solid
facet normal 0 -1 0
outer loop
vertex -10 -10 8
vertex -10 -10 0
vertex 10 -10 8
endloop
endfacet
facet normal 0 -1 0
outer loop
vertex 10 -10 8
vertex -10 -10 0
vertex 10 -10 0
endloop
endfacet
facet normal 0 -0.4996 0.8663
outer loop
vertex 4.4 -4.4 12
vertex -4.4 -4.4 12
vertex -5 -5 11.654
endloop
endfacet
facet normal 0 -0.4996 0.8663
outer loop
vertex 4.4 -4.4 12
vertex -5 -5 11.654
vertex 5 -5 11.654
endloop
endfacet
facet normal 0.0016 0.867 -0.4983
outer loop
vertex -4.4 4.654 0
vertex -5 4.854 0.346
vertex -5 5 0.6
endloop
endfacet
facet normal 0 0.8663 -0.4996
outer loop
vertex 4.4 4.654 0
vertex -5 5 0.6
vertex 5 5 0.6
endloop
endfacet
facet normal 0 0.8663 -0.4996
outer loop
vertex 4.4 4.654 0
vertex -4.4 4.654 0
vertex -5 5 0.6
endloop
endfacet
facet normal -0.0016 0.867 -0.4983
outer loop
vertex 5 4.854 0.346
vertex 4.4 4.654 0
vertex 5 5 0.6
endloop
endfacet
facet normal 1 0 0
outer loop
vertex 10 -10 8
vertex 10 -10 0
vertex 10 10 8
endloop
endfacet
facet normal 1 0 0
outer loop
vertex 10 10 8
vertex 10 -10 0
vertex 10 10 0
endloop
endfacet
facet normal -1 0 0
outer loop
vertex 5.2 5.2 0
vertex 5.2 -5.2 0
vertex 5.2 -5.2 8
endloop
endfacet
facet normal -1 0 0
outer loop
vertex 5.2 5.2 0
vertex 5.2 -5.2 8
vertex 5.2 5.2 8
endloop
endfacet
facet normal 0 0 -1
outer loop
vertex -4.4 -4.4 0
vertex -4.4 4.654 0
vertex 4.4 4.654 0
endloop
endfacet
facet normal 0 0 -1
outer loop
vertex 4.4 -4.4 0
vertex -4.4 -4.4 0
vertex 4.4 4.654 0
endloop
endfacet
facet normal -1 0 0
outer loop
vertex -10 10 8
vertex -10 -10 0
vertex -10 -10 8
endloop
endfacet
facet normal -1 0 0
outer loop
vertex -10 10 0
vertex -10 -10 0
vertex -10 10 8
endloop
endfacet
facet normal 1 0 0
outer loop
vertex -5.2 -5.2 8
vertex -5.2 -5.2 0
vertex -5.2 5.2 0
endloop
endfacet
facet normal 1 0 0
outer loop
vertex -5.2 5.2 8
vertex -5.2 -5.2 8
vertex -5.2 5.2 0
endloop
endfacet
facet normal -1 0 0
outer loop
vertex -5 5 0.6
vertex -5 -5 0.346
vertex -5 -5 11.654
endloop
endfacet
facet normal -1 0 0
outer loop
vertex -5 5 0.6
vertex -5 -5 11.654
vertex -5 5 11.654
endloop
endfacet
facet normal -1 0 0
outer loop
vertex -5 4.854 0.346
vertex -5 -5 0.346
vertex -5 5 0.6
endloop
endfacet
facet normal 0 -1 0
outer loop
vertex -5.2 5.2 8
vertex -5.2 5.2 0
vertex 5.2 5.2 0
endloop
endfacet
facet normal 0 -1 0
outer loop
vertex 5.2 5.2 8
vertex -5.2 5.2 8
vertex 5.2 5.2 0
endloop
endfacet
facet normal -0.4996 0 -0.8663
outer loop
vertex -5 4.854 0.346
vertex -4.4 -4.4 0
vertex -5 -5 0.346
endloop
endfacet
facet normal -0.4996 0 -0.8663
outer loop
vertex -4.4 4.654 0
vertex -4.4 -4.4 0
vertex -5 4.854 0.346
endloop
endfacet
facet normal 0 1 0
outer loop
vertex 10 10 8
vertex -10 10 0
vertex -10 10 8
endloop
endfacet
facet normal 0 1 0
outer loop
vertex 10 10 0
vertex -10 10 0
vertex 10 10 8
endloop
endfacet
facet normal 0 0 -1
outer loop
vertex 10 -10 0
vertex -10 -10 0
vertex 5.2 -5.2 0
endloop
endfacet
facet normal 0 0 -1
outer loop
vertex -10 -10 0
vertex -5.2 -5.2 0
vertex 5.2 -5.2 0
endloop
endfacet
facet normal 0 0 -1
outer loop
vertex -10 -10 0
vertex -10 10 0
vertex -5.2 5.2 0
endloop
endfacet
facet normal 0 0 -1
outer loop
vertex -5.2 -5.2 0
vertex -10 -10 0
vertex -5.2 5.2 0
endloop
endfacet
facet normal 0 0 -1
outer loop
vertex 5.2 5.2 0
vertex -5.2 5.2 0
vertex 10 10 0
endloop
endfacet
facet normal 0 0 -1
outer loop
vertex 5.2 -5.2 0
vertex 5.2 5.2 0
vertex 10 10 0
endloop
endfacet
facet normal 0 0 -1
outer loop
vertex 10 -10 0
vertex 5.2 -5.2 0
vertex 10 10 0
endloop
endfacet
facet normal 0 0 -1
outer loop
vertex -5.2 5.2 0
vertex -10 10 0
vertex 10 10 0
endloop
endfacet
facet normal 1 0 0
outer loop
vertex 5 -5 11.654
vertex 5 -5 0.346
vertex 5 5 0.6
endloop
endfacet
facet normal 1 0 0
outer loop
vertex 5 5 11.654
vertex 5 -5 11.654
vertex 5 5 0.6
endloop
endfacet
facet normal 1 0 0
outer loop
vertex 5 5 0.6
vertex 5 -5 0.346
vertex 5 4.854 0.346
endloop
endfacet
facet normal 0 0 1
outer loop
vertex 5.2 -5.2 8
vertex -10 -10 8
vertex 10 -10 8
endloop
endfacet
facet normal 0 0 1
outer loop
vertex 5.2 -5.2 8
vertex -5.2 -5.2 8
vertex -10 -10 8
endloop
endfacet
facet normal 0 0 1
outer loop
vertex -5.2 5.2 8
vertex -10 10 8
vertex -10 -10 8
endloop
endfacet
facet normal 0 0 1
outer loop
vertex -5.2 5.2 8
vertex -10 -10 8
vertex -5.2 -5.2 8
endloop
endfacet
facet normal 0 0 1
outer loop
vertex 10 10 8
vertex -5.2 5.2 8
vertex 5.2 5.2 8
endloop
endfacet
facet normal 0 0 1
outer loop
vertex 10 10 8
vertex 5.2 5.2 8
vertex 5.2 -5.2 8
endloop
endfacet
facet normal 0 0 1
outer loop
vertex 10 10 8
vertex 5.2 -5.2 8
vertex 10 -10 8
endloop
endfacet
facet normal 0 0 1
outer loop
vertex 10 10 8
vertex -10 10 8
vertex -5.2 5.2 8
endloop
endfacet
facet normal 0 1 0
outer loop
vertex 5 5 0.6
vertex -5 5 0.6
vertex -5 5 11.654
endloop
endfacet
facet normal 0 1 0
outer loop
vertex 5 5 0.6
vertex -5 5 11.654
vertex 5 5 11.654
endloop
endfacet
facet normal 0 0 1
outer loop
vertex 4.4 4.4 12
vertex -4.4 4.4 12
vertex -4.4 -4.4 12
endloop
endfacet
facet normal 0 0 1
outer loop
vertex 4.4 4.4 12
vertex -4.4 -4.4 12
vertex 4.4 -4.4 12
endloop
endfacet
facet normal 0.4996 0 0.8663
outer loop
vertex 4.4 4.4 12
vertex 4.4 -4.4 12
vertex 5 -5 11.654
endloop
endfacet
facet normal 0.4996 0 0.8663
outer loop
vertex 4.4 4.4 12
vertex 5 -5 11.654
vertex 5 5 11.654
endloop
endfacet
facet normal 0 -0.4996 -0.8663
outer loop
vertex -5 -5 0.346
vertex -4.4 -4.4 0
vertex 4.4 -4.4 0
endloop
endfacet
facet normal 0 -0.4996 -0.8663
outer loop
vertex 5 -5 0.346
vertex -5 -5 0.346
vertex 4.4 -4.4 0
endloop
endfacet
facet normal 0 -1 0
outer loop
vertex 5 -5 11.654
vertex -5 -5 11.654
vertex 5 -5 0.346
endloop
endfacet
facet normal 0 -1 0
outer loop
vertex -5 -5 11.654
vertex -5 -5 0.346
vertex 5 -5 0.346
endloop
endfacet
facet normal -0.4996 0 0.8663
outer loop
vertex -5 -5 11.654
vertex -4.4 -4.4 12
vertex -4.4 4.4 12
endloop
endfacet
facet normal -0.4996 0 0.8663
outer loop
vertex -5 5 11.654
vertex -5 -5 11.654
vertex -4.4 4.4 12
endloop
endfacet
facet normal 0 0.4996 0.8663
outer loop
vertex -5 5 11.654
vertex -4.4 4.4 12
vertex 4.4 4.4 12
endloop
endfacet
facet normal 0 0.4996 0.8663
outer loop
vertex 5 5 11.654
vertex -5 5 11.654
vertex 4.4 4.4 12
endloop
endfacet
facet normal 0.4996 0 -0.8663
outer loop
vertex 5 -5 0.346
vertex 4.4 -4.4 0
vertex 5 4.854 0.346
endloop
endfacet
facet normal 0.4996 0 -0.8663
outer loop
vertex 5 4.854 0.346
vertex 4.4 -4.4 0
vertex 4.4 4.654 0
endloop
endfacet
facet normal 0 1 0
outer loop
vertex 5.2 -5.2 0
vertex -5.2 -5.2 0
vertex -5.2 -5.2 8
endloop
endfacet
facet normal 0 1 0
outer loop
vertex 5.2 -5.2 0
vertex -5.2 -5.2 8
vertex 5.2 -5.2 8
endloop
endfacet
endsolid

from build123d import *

# Parameters (mm, degrees)
F0_W        = 10
F0_H        = 10
F1_DEPTH    = 12
F0_W_2      = 20
F0_H_2      = 20
F0_W_3      = 10.4
F0_H_3      = 10.4
F2_DEPTH    = 8
F3_C1_SIZE2 = 0.6
F3_C1_SIZE  = 0.3464101615
F3_C2_SIZE2 = 0.6
F3_C2_SIZE  = 0.3464101615
F3_C3_SIZE2 = 0.3464101615
F3_C3_SIZE  = 0.6
F3_C4_SIZE2 = 0.6
F3_C4_SIZE  = 0.3464101615
F3_C5_SIZE2 = 0.6
F3_C5_SIZE  = 0.3464101615
F3_C6_SIZE2 = 0.6
F3_C6_SIZE  = 0.3464101615
F3_C7_SIZE2 = 0.6
F3_C7_SIZE  = 0.3464101615
F3_C8_SIZE2 = 0.6
F3_C8_SIZE  = 0.3464101615


with BuildPart() as f1:
    # F0 (on Top) → F1 (new body)
    with BuildSketch(Plane.XY):
        Rectangle(F0_W, F0_H)
    extrude(amount=F1_DEPTH)

    # F3: chamfer of 0.6 x 0.3464101615 on 8 edges, made by hand

    # F3_c1
    f3_c1_edges = [f1.edges().sort_by_distance(p)[0] for p in [
        (5, 0, 0),
    ]]
    f3_c1_side = f1.faces().sort_by_distance((5, 0, 0.0069282032))[0]
    chamfer(f3_c1_edges, length=F3_C1_SIZE, length2=F3_C1_SIZE2, reference=f3_c1_side)

    # F3_c2
    f3_c2_edges = [f1.edges().sort_by_distance(p)[0] for p in [
        (5, 0, 12),
    ]]
    f3_c2_side = f1.faces().sort_by_distance((5, 0, 11.9930717968))[0]
    chamfer(f3_c2_edges, length=F3_C2_SIZE, length2=F3_C2_SIZE2, reference=f3_c2_side)

    # F3_c3
    f3_c3_edges = [f1.edges().sort_by_distance(p)[0] for p in [
        (-0.3, 5, 0),
    ]]
    f3_c3_side = f1.faces().sort_by_distance((-0.3, 5, 0.0069282032))[0]
    chamfer(f3_c3_edges, length=F3_C3_SIZE, length2=F3_C3_SIZE2, reference=f3_c3_side)

    # F3_c4
    f3_c4_edges = [f1.edges().sort_by_distance(p)[0] for p in [
        (-0.3, 5, 12),
    ]]
    f3_c4_side = f1.faces().sort_by_distance((-0.3, 5, 11.9930717968))[0]
    chamfer(f3_c4_edges, length=F3_C4_SIZE, length2=F3_C4_SIZE2, reference=f3_c4_side)

    # F3_c5
    f3_c5_edges = [f1.edges().sort_by_distance(p)[0] for p in [
        (-5, -0.1732050808, 0),
    ]]
    f3_c5_side = f1.faces().sort_by_distance((-5, -0.1732050808, 0.0069282032))[0]
    chamfer(f3_c5_edges, length=F3_C5_SIZE, length2=F3_C5_SIZE2, reference=f3_c5_side)

    # F3_c6
    f3_c6_edges = [f1.edges().sort_by_distance(p)[0] for p in [
        (-5, -0.3, 12),
    ]]
    f3_c6_side = f1.faces().sort_by_distance((-5, -0.3, 11.9930717968))[0]
    chamfer(f3_c6_edges, length=F3_C6_SIZE, length2=F3_C6_SIZE2, reference=f3_c6_side)

    # F3_c7
    f3_c7_edges = [f1.edges().sort_by_distance(p)[0] for p in [
        (0, -5, 0),
    ]]
    f3_c7_side = f1.faces().sort_by_distance((0, -5, 0.0069282032))[0]
    chamfer(f3_c7_edges, length=F3_C7_SIZE, length2=F3_C7_SIZE2, reference=f3_c7_side)

    # F3_c8
    f3_c8_edges = [f1.edges().sort_by_distance(p)[0] for p in [
        (0, -5, 12),
    ]]
    f3_c8_side = f1.faces().sort_by_distance((0, -5, 11.9930717968))[0]
    chamfer(f3_c8_edges, length=F3_C8_SIZE, length2=F3_C8_SIZE2, reference=f3_c8_side)


with BuildPart() as f2:
    # F0 (on Top) → F2 (new body)
    with BuildSketch(Plane.XY):
        Rectangle(F0_W_2, F0_H_2)
        Rectangle(F0_W_3, F0_H_3, mode=Mode.SUBTRACT)
    extrude(amount=F2_DEPTH)


solid = Compound([f1.part, f2.part])
